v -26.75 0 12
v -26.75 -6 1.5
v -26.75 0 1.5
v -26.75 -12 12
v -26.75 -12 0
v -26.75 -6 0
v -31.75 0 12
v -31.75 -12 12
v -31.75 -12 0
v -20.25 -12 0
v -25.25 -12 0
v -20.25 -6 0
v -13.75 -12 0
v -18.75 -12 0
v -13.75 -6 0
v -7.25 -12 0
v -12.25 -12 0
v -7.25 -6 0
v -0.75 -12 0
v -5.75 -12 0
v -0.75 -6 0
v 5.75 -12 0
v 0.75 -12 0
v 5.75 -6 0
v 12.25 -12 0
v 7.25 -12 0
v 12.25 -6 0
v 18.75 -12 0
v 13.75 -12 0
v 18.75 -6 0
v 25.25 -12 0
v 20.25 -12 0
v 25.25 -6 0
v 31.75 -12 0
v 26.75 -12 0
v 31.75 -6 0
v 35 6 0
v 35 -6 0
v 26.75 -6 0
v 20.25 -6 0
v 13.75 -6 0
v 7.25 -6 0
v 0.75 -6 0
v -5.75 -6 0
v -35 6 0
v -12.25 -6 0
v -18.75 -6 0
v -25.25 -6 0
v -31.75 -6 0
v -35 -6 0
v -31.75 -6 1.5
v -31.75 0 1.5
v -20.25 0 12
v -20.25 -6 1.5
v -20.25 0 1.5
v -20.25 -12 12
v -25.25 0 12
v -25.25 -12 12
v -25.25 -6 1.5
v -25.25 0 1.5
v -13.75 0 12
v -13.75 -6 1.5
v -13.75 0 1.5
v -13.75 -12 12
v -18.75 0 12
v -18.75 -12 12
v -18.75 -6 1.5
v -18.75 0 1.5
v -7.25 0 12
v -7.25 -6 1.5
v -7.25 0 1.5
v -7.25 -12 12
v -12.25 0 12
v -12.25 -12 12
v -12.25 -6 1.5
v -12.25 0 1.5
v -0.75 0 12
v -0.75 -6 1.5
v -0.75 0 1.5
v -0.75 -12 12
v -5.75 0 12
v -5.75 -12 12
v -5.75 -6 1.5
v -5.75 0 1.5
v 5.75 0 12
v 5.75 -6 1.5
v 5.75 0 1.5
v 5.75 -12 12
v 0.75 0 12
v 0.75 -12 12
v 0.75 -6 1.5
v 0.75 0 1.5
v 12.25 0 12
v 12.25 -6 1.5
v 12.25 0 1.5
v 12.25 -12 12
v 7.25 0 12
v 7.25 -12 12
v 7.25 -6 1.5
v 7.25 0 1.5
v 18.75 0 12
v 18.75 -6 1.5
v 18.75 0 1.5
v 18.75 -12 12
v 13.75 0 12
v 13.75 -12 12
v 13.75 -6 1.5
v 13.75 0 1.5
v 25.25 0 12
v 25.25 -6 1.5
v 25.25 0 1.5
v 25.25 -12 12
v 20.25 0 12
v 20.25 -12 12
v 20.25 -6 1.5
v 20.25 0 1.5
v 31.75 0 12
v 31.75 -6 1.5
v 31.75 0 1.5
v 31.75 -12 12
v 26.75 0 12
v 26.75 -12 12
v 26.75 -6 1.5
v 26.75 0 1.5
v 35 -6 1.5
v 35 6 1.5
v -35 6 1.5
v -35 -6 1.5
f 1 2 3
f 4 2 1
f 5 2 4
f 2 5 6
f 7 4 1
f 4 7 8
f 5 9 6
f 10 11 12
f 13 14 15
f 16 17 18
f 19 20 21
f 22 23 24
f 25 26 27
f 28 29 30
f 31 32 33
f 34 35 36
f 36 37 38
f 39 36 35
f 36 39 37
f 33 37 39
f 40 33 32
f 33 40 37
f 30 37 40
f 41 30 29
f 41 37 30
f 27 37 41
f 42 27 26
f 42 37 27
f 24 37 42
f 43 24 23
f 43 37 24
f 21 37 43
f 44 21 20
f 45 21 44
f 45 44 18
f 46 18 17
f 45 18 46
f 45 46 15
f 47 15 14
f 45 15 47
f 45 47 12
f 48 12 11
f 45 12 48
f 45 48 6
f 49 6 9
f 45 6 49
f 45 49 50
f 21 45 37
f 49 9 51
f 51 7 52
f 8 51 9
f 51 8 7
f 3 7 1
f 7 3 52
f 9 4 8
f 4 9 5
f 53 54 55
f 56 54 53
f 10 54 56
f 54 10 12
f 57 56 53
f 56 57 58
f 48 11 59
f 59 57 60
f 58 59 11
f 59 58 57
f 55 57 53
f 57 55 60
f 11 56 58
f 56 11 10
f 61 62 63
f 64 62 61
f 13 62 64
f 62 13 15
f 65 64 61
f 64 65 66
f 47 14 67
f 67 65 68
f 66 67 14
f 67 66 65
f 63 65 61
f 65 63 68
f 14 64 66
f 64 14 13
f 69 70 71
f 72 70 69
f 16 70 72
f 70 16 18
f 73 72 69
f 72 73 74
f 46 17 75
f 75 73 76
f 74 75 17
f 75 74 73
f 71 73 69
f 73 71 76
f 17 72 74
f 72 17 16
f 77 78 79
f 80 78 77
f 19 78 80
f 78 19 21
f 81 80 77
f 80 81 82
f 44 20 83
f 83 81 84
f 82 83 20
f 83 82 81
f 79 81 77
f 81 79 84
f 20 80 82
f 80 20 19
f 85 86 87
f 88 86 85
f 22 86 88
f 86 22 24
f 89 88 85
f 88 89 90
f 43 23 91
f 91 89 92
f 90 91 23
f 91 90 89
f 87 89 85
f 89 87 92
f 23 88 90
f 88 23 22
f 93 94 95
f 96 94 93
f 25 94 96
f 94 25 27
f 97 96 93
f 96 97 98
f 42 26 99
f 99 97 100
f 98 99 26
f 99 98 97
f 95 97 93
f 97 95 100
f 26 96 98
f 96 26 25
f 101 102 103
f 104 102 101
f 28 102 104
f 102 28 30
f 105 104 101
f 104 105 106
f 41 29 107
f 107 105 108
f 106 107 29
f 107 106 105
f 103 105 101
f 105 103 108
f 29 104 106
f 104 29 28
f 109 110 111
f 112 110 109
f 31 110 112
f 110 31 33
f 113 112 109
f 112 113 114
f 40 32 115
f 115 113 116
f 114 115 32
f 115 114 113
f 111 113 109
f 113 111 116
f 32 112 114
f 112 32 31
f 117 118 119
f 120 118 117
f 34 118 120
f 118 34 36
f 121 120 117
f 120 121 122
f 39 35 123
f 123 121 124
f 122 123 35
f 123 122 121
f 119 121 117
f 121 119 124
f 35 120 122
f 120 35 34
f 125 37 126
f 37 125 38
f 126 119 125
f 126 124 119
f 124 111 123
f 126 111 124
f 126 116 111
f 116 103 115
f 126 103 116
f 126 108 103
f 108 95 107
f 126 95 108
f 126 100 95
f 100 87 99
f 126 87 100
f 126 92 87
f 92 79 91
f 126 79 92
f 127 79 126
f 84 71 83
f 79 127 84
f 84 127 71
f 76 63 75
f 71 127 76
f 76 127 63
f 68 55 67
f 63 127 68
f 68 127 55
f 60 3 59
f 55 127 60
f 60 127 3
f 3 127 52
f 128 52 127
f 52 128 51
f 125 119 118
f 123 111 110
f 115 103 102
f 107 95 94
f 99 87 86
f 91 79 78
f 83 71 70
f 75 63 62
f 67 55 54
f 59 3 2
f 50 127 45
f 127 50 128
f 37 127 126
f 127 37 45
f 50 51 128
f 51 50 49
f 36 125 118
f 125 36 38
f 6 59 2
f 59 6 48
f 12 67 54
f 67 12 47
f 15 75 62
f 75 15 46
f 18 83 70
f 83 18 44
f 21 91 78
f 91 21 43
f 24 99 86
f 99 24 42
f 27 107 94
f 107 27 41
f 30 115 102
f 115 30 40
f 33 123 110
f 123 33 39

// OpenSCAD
// 10-well comb for casting agarose gels
// Print orientation: flat on bed, teeth pointing down (-Z)

// ---------- Parameters ----------
plate_len    = 70;    // spine length along X (mm)
plate_wid    = 12;    // spine width along Y (mm)
plate_t      = 1.5;   // plate thickness along Z (mm)

tooth_count  = 10;    // number of wells/teeth
tooth_w      = 5.0;   // tooth width along X (mm)
tooth_len    = 12;    // tooth length along Y (mm)
tooth_h      = 12;    // tooth height from plate top (mm)

gap          = 1.5;   // gap between neighbouring teeth along X (mm)
overcut      = 0.5;   // extra length so cutters pass through faces (mm)

$fn = 64;

// ---------- Derived ----------
pitch    = tooth_w + gap;                 // centre-to-centre spacing
x_start  = -(tooth_count - 1) * pitch / 2; // first tooth centre (row centred)
plate_h  = plate_t + tooth_h;             // overall height

// ---------- Model ----------
union() {
    // Base plate (spine/back bar)
    translate([-plate_len / 2, -plate_wid / 2, 0])
        cube([plate_len, plate_wid, plate_t]);

    // Teeth, hanging from one long edge of the plate in -Y
    for (i = [0 : tooth_count - 1]) {
        x = x_start + i * pitch;
        translate([x - tooth_w / 2, -plate_wid / 2 - tooth_len / 2, 0])
            cube([tooth_w, tooth_len, tooth_h]);
    }
}

// ---------- Bill of materials ----------
// 1 x comb plate: 70 x 12 x 1.5 mm (PLA)
// 10 x teeth: 5.0 x 12 x 12 mm (PLA)
